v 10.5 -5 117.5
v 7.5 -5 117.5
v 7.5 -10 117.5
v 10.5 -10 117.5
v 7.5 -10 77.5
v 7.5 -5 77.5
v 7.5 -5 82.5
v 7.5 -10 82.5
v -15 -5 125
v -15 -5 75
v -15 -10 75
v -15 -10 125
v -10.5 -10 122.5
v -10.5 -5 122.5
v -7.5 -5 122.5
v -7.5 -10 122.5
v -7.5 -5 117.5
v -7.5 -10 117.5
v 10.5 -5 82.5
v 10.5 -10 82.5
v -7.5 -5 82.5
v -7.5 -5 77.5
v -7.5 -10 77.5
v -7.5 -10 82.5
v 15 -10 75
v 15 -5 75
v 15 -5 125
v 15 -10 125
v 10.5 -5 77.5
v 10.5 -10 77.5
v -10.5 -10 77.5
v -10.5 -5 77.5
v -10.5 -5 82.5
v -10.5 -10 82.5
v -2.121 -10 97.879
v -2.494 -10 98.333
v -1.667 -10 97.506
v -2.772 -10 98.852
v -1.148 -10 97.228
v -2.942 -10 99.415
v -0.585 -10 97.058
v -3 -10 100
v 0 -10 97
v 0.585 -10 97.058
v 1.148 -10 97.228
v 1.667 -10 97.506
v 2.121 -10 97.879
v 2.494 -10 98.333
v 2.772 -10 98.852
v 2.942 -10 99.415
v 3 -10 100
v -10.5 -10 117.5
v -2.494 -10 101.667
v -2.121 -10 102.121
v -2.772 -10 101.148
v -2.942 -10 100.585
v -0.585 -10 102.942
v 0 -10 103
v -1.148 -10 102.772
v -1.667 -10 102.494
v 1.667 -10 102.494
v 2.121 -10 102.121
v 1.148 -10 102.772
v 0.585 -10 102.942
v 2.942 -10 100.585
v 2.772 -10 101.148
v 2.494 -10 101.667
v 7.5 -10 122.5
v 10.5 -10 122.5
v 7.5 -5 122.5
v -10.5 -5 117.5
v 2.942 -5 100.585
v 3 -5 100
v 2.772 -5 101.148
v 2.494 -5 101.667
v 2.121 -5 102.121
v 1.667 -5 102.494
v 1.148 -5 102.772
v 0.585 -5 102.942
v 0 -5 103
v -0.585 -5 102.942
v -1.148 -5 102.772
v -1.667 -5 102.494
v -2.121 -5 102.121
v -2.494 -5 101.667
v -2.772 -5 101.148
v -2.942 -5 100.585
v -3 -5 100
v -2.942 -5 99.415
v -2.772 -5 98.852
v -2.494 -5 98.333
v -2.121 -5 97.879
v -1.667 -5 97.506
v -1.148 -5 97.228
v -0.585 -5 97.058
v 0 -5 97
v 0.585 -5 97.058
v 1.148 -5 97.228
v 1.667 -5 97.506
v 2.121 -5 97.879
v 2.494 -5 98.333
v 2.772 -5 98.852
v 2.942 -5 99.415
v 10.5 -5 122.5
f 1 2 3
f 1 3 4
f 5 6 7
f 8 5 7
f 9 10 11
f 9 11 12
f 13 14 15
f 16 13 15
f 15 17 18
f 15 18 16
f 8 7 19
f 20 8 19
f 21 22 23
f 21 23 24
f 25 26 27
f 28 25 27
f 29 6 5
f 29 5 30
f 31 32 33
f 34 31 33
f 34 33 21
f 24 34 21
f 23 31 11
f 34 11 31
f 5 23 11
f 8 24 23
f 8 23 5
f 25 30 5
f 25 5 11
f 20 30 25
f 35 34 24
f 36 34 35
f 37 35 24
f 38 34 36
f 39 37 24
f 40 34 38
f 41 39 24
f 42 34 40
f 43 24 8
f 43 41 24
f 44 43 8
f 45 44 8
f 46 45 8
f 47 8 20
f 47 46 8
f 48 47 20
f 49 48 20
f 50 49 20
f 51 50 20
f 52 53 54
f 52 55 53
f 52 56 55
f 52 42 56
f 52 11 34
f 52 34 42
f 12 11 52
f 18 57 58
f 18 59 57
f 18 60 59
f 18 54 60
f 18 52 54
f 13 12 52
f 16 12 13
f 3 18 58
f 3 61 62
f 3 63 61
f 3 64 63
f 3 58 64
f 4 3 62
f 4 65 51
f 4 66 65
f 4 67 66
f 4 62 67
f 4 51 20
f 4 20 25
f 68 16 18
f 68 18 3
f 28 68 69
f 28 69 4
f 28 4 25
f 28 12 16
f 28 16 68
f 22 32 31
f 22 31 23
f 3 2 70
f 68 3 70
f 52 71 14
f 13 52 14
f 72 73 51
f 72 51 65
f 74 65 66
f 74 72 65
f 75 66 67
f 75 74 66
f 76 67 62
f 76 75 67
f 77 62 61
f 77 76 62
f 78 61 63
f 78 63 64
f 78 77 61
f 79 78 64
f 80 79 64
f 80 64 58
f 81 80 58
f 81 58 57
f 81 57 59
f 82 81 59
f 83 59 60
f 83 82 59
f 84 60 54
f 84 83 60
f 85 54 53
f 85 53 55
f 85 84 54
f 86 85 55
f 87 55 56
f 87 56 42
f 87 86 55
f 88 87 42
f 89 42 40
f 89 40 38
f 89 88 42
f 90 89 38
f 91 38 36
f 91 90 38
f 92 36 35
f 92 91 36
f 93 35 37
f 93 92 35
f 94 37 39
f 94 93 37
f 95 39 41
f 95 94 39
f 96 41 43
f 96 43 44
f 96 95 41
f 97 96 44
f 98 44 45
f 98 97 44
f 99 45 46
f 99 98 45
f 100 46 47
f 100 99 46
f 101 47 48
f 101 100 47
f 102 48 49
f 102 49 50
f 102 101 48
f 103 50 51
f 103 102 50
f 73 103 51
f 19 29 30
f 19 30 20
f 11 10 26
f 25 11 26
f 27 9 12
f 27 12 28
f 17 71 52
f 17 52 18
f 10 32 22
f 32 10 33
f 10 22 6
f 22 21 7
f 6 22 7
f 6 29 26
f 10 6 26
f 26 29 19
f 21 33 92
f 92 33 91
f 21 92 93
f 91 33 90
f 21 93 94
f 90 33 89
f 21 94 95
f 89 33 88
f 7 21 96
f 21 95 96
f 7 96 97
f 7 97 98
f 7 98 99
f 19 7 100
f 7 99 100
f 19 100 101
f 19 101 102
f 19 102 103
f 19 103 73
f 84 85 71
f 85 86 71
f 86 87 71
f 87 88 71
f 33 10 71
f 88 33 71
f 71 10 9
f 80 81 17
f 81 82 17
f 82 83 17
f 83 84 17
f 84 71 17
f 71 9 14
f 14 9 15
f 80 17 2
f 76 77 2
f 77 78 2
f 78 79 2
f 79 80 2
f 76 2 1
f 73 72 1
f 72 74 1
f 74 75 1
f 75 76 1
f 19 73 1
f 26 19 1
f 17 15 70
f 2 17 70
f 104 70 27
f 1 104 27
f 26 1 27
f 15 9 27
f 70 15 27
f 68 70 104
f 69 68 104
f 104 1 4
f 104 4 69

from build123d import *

# Parameters (mm, degrees)
SKETCH012_W   = 30
SKETCH012_H   = 50
SKETCH012_R   = 3
SKETCH012_W_2 = 3
SKETCH012_H_2 = 5
PAD012_DEPTH  = 5


with BuildPart() as part:
    # Sketch012 → Pad012 (new body)
    with BuildSketch(Plane(origin=(0, -5, 100), x_dir=(1, 0, 0), z_dir=(0, -1, 0))):
        Rectangle(SKETCH012_W, SKETCH012_H)
        Circle(SKETCH012_R, mode=Mode.SUBTRACT)
        with Locations((-9, 20)):
            Rectangle(SKETCH012_W_2, SKETCH012_H_2, mode=Mode.SUBTRACT)
        with Locations((9, 20)):
            Rectangle(SKETCH012_W_2, SKETCH012_H_2, mode=Mode.SUBTRACT)
        with Locations((-9, -20)):
            Rectangle(SKETCH012_W_2, SKETCH012_H_2, mode=Mode.SUBTRACT)
        with Locations((9, -20)):
            Rectangle(SKETCH012_W_2, SKETCH012_H_2, mode=Mode.SUBTRACT)
    extrude(amount=PAD012_DEPTH)


solid = part.part
